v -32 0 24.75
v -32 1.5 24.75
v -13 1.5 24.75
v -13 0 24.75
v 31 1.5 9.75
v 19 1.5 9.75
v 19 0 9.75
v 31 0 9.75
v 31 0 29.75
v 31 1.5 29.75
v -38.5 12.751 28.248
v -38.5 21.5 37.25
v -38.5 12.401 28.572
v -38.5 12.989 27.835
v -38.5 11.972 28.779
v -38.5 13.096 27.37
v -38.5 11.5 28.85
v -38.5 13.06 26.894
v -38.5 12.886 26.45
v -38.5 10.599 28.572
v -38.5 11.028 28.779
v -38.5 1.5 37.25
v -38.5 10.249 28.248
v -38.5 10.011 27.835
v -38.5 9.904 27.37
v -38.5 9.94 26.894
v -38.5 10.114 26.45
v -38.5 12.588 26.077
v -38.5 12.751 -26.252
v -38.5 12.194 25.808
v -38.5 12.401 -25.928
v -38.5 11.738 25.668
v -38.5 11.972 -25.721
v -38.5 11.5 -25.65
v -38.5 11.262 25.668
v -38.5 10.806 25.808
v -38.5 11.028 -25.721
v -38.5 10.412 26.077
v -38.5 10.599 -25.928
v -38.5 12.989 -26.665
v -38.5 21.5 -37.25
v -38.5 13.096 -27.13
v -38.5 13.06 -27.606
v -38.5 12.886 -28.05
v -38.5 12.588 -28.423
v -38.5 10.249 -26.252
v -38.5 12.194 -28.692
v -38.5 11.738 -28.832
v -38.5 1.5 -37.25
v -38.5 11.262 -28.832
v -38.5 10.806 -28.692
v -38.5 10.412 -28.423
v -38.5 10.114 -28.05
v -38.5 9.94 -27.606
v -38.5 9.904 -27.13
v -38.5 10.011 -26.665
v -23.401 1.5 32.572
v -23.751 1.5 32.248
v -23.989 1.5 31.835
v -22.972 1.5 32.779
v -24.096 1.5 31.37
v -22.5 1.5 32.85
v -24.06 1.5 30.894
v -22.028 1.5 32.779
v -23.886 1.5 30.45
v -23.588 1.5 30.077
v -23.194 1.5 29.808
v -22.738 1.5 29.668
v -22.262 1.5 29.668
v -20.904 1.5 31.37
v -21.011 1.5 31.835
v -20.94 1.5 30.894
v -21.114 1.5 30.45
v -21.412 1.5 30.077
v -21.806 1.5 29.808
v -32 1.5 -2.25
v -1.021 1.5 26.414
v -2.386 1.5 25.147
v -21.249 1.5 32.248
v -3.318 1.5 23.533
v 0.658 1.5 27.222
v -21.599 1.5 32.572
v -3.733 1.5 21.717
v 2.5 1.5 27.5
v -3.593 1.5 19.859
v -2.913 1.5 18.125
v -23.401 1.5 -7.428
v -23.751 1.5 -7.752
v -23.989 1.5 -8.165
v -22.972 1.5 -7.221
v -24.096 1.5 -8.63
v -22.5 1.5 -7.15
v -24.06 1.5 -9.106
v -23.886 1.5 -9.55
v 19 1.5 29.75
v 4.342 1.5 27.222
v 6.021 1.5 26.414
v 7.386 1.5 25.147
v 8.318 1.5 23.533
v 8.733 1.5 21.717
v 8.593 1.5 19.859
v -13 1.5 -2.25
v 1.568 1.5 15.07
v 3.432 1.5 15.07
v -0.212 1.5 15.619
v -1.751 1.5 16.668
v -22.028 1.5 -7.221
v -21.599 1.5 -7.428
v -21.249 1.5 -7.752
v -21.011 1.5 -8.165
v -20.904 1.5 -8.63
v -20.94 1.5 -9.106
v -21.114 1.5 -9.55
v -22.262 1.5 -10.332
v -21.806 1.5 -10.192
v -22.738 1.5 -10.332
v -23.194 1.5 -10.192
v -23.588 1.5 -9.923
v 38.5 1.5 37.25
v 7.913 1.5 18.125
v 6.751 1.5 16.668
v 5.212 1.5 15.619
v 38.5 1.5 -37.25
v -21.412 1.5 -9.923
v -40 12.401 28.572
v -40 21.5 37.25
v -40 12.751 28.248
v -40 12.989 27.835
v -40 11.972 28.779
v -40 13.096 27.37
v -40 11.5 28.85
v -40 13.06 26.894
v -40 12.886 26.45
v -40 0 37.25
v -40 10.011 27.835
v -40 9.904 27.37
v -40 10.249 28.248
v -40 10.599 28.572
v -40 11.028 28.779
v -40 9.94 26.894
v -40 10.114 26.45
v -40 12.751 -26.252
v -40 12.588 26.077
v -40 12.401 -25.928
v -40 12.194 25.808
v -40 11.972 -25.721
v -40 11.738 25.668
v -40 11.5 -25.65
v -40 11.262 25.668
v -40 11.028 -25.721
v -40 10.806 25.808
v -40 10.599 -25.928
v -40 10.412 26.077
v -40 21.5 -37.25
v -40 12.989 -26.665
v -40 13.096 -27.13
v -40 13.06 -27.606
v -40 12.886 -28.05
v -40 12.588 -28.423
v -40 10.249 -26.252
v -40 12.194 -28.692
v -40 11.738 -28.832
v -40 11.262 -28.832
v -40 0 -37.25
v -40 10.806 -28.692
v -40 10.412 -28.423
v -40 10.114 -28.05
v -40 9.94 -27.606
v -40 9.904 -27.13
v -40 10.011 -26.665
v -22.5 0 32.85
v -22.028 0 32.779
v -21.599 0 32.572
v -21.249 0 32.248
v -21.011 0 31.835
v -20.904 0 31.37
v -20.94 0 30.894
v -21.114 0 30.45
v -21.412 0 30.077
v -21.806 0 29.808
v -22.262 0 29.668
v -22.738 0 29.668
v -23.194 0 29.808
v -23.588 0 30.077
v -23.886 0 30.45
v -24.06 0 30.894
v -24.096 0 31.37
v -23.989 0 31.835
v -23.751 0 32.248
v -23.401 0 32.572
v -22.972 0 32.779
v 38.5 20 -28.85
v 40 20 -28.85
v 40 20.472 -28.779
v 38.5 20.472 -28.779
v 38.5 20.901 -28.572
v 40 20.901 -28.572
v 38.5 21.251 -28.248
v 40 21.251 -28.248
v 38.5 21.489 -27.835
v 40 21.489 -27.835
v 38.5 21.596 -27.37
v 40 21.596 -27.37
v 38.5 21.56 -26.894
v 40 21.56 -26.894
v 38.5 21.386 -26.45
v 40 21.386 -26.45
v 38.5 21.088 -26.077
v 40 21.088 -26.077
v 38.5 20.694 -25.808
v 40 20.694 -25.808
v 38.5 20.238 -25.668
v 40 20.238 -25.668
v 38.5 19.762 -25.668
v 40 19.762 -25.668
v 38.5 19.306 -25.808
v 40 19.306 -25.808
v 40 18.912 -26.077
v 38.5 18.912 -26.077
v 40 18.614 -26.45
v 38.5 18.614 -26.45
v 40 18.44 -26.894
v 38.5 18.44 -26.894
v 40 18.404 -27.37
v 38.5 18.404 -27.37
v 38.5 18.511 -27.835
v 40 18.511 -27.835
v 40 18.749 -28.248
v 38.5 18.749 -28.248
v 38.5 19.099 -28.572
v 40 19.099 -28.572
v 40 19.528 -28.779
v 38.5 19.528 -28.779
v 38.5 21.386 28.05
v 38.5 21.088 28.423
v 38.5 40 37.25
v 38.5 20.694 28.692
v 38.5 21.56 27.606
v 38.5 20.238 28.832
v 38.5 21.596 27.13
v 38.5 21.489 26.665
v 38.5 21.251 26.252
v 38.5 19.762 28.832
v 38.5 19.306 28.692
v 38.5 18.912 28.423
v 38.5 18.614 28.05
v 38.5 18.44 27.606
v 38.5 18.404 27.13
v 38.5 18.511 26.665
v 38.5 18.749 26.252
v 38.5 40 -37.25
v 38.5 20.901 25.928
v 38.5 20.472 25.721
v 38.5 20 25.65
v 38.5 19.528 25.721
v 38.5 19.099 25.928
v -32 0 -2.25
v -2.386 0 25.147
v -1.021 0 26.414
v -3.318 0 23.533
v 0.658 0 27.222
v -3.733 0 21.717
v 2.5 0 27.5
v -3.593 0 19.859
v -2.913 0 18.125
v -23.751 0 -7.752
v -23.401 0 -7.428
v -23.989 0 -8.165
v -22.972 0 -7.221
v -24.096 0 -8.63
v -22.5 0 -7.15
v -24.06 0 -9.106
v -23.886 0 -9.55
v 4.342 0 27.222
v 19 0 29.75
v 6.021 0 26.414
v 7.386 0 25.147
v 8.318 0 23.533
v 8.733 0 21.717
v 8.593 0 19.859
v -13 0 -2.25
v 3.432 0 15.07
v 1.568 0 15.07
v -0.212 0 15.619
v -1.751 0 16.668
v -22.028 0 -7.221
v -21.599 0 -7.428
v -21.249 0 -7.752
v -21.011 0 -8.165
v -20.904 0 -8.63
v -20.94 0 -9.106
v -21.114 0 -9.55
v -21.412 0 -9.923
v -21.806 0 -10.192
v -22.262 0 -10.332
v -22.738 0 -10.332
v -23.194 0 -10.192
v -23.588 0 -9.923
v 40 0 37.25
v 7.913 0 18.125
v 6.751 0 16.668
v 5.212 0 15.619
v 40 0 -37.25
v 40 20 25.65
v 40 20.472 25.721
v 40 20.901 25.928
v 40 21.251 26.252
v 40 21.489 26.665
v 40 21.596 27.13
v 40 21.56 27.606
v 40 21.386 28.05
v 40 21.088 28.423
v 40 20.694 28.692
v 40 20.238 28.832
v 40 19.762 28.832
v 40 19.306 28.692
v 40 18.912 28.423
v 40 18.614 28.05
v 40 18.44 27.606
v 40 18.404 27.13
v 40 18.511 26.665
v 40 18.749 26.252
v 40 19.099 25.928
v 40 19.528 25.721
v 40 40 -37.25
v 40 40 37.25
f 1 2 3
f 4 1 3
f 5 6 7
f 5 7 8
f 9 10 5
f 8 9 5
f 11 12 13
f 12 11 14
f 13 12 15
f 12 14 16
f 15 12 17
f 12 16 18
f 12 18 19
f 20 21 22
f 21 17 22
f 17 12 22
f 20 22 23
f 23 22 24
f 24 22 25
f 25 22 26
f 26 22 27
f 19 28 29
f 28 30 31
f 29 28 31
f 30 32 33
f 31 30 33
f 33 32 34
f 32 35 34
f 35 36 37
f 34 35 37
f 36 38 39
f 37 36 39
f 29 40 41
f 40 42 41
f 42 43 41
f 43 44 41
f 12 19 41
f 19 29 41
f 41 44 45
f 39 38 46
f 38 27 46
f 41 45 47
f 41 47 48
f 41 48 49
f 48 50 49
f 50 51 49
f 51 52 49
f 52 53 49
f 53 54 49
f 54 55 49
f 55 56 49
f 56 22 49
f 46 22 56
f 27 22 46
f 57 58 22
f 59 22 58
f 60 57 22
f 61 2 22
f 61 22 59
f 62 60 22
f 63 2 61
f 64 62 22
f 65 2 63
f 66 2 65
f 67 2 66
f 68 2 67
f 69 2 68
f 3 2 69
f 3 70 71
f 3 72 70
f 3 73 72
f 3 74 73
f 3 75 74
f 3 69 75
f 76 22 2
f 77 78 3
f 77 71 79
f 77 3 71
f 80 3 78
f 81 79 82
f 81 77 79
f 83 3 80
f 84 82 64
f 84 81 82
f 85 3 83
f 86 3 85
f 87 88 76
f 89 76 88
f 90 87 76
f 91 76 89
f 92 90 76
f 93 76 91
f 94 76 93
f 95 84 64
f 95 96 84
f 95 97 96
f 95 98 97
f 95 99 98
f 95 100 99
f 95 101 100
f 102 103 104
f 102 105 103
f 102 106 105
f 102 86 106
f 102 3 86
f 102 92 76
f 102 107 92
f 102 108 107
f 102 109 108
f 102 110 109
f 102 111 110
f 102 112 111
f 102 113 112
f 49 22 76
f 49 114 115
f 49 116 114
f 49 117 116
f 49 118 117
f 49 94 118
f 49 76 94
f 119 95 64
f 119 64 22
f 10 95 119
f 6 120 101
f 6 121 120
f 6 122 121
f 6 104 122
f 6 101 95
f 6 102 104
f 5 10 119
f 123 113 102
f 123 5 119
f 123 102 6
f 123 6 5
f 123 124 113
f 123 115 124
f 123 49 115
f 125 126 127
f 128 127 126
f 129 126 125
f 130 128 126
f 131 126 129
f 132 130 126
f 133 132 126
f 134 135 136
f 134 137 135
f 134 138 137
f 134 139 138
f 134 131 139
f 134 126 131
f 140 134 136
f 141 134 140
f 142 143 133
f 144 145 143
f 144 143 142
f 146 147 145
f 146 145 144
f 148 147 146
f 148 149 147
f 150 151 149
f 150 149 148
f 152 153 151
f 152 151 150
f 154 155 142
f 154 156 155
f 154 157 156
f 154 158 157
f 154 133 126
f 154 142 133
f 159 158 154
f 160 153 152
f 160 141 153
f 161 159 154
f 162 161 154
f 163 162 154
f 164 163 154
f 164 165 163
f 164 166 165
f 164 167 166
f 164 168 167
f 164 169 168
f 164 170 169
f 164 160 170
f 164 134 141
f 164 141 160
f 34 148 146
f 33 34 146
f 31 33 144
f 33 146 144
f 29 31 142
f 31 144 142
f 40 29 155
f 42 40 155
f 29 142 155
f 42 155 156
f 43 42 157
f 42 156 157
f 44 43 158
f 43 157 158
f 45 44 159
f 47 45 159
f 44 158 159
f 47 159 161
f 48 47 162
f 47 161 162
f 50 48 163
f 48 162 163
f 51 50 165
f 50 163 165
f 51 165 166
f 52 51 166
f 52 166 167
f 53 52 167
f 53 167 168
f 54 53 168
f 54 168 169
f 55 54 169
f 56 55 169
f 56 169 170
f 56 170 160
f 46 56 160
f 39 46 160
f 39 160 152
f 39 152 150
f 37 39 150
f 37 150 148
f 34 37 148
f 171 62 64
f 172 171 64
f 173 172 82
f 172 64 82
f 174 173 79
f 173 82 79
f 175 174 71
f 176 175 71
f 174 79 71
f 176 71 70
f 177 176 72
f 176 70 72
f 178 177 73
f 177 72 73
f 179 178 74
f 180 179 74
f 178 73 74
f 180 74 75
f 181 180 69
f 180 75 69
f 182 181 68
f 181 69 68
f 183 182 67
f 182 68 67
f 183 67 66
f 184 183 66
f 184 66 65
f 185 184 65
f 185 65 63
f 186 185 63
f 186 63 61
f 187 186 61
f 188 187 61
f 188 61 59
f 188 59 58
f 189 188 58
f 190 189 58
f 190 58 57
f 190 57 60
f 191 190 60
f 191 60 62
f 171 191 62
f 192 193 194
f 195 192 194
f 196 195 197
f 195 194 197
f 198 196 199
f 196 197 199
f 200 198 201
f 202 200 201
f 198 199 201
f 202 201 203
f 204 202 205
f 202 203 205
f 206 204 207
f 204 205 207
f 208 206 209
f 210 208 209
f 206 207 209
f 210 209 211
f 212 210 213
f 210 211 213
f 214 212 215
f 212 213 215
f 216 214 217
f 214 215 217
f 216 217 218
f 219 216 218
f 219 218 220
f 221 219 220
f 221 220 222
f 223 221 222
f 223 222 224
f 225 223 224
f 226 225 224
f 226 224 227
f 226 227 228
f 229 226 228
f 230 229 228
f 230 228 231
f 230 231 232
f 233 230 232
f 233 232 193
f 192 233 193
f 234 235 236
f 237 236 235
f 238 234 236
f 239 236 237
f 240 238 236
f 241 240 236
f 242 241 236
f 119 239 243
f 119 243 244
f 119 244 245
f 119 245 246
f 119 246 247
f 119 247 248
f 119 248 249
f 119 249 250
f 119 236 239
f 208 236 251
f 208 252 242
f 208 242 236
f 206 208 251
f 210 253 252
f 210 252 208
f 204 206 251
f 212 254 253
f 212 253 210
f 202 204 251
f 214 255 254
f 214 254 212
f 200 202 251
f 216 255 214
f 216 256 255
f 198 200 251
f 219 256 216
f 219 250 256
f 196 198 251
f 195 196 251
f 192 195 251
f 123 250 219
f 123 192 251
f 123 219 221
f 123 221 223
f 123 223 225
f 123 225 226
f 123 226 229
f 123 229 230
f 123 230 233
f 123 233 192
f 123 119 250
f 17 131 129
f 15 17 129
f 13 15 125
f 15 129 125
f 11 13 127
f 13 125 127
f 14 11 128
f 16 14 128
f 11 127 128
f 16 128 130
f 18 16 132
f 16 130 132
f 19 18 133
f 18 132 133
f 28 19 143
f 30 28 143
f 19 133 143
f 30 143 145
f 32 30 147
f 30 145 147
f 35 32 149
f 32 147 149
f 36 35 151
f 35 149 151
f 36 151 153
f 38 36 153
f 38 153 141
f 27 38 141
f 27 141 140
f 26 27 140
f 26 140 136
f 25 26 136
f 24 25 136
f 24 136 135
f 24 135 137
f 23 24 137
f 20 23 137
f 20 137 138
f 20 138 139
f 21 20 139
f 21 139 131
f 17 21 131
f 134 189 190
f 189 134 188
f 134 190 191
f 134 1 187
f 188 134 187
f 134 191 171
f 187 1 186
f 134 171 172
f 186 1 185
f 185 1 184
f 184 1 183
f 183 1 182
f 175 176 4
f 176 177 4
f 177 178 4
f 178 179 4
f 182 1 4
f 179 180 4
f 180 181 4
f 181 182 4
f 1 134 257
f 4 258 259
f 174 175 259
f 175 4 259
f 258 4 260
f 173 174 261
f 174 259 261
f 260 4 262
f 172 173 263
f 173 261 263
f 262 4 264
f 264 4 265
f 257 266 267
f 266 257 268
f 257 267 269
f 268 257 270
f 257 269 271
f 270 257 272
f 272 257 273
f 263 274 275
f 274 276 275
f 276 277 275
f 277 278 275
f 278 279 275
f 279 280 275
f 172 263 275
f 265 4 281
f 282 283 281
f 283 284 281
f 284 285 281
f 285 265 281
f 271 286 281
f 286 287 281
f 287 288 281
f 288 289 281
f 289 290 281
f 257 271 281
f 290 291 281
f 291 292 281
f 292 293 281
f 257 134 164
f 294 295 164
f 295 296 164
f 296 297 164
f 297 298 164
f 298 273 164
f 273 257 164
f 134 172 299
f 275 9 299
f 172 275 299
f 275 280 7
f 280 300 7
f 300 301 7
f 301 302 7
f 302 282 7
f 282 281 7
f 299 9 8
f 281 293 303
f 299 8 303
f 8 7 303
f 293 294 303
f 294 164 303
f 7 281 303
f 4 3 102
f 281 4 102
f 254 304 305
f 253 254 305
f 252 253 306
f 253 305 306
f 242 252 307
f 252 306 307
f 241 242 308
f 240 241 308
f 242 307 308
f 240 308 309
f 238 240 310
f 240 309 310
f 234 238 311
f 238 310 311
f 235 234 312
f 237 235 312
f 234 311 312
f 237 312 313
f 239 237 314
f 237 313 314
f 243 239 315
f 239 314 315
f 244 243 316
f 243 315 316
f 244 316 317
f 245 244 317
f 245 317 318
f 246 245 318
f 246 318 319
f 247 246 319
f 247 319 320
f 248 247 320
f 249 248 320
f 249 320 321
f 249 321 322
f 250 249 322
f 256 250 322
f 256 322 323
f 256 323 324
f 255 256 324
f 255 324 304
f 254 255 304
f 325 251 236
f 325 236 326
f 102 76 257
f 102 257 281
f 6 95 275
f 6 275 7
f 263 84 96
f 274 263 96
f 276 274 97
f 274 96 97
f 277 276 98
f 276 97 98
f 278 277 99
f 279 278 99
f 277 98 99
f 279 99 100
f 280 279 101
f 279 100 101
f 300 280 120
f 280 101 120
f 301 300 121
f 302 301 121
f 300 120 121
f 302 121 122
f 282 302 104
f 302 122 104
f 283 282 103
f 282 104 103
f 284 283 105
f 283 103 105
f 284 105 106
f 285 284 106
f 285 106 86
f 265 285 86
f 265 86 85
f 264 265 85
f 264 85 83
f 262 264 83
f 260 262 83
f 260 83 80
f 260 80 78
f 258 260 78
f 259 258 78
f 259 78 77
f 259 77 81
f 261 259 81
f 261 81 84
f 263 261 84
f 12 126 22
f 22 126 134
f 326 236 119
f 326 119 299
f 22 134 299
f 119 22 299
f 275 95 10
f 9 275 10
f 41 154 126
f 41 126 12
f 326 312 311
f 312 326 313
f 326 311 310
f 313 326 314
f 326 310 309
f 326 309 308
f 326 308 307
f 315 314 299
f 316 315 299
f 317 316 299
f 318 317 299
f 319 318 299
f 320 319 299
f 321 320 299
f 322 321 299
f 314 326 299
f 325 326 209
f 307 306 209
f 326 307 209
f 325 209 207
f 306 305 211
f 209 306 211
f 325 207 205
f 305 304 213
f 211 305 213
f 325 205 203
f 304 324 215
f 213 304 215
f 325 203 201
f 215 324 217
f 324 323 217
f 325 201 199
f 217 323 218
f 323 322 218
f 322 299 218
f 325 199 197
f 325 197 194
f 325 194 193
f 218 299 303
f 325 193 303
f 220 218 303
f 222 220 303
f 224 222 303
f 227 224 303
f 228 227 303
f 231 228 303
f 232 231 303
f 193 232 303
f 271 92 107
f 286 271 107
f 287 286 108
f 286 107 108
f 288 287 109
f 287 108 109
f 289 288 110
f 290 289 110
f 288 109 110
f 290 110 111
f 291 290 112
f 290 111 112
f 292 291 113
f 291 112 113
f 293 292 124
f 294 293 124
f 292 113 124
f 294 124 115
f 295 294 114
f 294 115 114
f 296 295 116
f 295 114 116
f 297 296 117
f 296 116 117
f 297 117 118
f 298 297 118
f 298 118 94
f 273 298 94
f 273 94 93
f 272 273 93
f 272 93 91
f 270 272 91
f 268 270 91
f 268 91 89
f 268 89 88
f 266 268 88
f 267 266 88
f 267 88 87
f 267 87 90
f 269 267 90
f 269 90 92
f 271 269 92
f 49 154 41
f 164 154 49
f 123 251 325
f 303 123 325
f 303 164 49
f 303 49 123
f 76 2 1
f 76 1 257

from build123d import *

# Parameters (mm, degrees)
SKETCH1_W           = 80
SKETCH1_H           = 74.5
BOSS_EXTRUDE1_DEPTH = 1.5
SKETCH2_W           = 1.5
SKETCH2_H           = 74.5
BOSS_EXTRUDE2_DEPTH = 20
SKETCH3_W           = 1.5
SKETCH3_H           = 74.5
BOSS_EXTRUDE3_DEPTH = 38.5
SKETCH4_R           = 1.6
SKETCH4_R_2         = 6.25
SKETCH4_W           = 19
SKETCH4_H           = 27
SKETCH4_W_2         = 12
SKETCH4_H_2         = 20
CUT_EXTRUDE1_DEPTH  = 40
SKETCH5_R           = 1.6
CUT_EXTRUDE2_DEPTH  = 40
SKETCH6_R           = 1.6
CUT_EXTRUDE3_DEPTH  = 40


with BuildPart() as part:
    # Sketch1 → Boss-Extrude1 (new body)
    with BuildSketch(Plane(origin=(0, 0, 0), x_dir=(1, 0, 0), z_dir=(0, 1, 0))):
        Rectangle(SKETCH1_W, SKETCH1_H)
    extrude(amount=BOSS_EXTRUDE1_DEPTH)

    # Sketch2 → Boss-Extrude2 (add)
    with BuildSketch(Plane(origin=(0, 1.5, 0), x_dir=(1, 0, 0), z_dir=(0, 1, 0))):
        with Locations((-39.25, 0)):
            Rectangle(SKETCH2_W, SKETCH2_H)
    extrude(amount=BOSS_EXTRUDE2_DEPTH)

    # Sketch3 → Boss-Extrude3 (add)
    with BuildSketch(Plane(origin=(0, 1.5, 0), x_dir=(1, 0, 0), z_dir=(0, 1, 0))):
        with Locations((39.25, 0)):
            Rectangle(SKETCH3_W, SKETCH3_H)
    extrude(amount=BOSS_EXTRUDE3_DEPTH)

    # Sketch4 → Cut-Extrude1 (cut)
    with BuildSketch(Plane(origin=(0, 1.5, 0), x_dir=(1, 0, 0), z_dir=(0, 1, 0))):
        with Locations(Location((-22.5, 8.75, 0), (0, 0, 270))):
            Circle(SKETCH4_R)
        with Locations(Location((-22.5, -31.25, 0), (0, 0, 270))):
            Circle(SKETCH4_R)
        with Locations(Location((2.5, -21.25, 0), (0, 0, 270))):
            Circle(SKETCH4_R_2)
        with Locations((-22.5, -11.25)):
            Rectangle(SKETCH4_W, SKETCH4_H)
        with Locations((25, -19.75)):
            Rectangle(SKETCH4_W_2, SKETCH4_H_2)
    extrude(amount=-CUT_EXTRUDE1_DEPTH, mode=Mode.SUBTRACT)

    # Sketch5 → Cut-Extrude2 (cut)
    with BuildSketch(Plane.ZY.offset(40)):
        with Locations((27.25, 11.5)):
            Circle(SKETCH5_R)
        with Locations((-27.25, 11.5)):
            Circle(SKETCH5_R)
    extrude(amount=-CUT_EXTRUDE2_DEPTH, mode=Mode.SUBTRACT)

    # Sketch6 → Cut-Extrude3 (cut)
    with BuildSketch(Plane(origin=(40, 0, 0), x_dir=(0, 0, -1), z_dir=(1, 0, 0))):
        with Locations((-27.25, 20)):
            Circle(SKETCH6_R)
        with Locations((27.25, 20)):
            Circle(SKETCH6_R)
    extrude(amount=-CUT_EXTRUDE3_DEPTH, mode=Mode.SUBTRACT)


solid = part.part
